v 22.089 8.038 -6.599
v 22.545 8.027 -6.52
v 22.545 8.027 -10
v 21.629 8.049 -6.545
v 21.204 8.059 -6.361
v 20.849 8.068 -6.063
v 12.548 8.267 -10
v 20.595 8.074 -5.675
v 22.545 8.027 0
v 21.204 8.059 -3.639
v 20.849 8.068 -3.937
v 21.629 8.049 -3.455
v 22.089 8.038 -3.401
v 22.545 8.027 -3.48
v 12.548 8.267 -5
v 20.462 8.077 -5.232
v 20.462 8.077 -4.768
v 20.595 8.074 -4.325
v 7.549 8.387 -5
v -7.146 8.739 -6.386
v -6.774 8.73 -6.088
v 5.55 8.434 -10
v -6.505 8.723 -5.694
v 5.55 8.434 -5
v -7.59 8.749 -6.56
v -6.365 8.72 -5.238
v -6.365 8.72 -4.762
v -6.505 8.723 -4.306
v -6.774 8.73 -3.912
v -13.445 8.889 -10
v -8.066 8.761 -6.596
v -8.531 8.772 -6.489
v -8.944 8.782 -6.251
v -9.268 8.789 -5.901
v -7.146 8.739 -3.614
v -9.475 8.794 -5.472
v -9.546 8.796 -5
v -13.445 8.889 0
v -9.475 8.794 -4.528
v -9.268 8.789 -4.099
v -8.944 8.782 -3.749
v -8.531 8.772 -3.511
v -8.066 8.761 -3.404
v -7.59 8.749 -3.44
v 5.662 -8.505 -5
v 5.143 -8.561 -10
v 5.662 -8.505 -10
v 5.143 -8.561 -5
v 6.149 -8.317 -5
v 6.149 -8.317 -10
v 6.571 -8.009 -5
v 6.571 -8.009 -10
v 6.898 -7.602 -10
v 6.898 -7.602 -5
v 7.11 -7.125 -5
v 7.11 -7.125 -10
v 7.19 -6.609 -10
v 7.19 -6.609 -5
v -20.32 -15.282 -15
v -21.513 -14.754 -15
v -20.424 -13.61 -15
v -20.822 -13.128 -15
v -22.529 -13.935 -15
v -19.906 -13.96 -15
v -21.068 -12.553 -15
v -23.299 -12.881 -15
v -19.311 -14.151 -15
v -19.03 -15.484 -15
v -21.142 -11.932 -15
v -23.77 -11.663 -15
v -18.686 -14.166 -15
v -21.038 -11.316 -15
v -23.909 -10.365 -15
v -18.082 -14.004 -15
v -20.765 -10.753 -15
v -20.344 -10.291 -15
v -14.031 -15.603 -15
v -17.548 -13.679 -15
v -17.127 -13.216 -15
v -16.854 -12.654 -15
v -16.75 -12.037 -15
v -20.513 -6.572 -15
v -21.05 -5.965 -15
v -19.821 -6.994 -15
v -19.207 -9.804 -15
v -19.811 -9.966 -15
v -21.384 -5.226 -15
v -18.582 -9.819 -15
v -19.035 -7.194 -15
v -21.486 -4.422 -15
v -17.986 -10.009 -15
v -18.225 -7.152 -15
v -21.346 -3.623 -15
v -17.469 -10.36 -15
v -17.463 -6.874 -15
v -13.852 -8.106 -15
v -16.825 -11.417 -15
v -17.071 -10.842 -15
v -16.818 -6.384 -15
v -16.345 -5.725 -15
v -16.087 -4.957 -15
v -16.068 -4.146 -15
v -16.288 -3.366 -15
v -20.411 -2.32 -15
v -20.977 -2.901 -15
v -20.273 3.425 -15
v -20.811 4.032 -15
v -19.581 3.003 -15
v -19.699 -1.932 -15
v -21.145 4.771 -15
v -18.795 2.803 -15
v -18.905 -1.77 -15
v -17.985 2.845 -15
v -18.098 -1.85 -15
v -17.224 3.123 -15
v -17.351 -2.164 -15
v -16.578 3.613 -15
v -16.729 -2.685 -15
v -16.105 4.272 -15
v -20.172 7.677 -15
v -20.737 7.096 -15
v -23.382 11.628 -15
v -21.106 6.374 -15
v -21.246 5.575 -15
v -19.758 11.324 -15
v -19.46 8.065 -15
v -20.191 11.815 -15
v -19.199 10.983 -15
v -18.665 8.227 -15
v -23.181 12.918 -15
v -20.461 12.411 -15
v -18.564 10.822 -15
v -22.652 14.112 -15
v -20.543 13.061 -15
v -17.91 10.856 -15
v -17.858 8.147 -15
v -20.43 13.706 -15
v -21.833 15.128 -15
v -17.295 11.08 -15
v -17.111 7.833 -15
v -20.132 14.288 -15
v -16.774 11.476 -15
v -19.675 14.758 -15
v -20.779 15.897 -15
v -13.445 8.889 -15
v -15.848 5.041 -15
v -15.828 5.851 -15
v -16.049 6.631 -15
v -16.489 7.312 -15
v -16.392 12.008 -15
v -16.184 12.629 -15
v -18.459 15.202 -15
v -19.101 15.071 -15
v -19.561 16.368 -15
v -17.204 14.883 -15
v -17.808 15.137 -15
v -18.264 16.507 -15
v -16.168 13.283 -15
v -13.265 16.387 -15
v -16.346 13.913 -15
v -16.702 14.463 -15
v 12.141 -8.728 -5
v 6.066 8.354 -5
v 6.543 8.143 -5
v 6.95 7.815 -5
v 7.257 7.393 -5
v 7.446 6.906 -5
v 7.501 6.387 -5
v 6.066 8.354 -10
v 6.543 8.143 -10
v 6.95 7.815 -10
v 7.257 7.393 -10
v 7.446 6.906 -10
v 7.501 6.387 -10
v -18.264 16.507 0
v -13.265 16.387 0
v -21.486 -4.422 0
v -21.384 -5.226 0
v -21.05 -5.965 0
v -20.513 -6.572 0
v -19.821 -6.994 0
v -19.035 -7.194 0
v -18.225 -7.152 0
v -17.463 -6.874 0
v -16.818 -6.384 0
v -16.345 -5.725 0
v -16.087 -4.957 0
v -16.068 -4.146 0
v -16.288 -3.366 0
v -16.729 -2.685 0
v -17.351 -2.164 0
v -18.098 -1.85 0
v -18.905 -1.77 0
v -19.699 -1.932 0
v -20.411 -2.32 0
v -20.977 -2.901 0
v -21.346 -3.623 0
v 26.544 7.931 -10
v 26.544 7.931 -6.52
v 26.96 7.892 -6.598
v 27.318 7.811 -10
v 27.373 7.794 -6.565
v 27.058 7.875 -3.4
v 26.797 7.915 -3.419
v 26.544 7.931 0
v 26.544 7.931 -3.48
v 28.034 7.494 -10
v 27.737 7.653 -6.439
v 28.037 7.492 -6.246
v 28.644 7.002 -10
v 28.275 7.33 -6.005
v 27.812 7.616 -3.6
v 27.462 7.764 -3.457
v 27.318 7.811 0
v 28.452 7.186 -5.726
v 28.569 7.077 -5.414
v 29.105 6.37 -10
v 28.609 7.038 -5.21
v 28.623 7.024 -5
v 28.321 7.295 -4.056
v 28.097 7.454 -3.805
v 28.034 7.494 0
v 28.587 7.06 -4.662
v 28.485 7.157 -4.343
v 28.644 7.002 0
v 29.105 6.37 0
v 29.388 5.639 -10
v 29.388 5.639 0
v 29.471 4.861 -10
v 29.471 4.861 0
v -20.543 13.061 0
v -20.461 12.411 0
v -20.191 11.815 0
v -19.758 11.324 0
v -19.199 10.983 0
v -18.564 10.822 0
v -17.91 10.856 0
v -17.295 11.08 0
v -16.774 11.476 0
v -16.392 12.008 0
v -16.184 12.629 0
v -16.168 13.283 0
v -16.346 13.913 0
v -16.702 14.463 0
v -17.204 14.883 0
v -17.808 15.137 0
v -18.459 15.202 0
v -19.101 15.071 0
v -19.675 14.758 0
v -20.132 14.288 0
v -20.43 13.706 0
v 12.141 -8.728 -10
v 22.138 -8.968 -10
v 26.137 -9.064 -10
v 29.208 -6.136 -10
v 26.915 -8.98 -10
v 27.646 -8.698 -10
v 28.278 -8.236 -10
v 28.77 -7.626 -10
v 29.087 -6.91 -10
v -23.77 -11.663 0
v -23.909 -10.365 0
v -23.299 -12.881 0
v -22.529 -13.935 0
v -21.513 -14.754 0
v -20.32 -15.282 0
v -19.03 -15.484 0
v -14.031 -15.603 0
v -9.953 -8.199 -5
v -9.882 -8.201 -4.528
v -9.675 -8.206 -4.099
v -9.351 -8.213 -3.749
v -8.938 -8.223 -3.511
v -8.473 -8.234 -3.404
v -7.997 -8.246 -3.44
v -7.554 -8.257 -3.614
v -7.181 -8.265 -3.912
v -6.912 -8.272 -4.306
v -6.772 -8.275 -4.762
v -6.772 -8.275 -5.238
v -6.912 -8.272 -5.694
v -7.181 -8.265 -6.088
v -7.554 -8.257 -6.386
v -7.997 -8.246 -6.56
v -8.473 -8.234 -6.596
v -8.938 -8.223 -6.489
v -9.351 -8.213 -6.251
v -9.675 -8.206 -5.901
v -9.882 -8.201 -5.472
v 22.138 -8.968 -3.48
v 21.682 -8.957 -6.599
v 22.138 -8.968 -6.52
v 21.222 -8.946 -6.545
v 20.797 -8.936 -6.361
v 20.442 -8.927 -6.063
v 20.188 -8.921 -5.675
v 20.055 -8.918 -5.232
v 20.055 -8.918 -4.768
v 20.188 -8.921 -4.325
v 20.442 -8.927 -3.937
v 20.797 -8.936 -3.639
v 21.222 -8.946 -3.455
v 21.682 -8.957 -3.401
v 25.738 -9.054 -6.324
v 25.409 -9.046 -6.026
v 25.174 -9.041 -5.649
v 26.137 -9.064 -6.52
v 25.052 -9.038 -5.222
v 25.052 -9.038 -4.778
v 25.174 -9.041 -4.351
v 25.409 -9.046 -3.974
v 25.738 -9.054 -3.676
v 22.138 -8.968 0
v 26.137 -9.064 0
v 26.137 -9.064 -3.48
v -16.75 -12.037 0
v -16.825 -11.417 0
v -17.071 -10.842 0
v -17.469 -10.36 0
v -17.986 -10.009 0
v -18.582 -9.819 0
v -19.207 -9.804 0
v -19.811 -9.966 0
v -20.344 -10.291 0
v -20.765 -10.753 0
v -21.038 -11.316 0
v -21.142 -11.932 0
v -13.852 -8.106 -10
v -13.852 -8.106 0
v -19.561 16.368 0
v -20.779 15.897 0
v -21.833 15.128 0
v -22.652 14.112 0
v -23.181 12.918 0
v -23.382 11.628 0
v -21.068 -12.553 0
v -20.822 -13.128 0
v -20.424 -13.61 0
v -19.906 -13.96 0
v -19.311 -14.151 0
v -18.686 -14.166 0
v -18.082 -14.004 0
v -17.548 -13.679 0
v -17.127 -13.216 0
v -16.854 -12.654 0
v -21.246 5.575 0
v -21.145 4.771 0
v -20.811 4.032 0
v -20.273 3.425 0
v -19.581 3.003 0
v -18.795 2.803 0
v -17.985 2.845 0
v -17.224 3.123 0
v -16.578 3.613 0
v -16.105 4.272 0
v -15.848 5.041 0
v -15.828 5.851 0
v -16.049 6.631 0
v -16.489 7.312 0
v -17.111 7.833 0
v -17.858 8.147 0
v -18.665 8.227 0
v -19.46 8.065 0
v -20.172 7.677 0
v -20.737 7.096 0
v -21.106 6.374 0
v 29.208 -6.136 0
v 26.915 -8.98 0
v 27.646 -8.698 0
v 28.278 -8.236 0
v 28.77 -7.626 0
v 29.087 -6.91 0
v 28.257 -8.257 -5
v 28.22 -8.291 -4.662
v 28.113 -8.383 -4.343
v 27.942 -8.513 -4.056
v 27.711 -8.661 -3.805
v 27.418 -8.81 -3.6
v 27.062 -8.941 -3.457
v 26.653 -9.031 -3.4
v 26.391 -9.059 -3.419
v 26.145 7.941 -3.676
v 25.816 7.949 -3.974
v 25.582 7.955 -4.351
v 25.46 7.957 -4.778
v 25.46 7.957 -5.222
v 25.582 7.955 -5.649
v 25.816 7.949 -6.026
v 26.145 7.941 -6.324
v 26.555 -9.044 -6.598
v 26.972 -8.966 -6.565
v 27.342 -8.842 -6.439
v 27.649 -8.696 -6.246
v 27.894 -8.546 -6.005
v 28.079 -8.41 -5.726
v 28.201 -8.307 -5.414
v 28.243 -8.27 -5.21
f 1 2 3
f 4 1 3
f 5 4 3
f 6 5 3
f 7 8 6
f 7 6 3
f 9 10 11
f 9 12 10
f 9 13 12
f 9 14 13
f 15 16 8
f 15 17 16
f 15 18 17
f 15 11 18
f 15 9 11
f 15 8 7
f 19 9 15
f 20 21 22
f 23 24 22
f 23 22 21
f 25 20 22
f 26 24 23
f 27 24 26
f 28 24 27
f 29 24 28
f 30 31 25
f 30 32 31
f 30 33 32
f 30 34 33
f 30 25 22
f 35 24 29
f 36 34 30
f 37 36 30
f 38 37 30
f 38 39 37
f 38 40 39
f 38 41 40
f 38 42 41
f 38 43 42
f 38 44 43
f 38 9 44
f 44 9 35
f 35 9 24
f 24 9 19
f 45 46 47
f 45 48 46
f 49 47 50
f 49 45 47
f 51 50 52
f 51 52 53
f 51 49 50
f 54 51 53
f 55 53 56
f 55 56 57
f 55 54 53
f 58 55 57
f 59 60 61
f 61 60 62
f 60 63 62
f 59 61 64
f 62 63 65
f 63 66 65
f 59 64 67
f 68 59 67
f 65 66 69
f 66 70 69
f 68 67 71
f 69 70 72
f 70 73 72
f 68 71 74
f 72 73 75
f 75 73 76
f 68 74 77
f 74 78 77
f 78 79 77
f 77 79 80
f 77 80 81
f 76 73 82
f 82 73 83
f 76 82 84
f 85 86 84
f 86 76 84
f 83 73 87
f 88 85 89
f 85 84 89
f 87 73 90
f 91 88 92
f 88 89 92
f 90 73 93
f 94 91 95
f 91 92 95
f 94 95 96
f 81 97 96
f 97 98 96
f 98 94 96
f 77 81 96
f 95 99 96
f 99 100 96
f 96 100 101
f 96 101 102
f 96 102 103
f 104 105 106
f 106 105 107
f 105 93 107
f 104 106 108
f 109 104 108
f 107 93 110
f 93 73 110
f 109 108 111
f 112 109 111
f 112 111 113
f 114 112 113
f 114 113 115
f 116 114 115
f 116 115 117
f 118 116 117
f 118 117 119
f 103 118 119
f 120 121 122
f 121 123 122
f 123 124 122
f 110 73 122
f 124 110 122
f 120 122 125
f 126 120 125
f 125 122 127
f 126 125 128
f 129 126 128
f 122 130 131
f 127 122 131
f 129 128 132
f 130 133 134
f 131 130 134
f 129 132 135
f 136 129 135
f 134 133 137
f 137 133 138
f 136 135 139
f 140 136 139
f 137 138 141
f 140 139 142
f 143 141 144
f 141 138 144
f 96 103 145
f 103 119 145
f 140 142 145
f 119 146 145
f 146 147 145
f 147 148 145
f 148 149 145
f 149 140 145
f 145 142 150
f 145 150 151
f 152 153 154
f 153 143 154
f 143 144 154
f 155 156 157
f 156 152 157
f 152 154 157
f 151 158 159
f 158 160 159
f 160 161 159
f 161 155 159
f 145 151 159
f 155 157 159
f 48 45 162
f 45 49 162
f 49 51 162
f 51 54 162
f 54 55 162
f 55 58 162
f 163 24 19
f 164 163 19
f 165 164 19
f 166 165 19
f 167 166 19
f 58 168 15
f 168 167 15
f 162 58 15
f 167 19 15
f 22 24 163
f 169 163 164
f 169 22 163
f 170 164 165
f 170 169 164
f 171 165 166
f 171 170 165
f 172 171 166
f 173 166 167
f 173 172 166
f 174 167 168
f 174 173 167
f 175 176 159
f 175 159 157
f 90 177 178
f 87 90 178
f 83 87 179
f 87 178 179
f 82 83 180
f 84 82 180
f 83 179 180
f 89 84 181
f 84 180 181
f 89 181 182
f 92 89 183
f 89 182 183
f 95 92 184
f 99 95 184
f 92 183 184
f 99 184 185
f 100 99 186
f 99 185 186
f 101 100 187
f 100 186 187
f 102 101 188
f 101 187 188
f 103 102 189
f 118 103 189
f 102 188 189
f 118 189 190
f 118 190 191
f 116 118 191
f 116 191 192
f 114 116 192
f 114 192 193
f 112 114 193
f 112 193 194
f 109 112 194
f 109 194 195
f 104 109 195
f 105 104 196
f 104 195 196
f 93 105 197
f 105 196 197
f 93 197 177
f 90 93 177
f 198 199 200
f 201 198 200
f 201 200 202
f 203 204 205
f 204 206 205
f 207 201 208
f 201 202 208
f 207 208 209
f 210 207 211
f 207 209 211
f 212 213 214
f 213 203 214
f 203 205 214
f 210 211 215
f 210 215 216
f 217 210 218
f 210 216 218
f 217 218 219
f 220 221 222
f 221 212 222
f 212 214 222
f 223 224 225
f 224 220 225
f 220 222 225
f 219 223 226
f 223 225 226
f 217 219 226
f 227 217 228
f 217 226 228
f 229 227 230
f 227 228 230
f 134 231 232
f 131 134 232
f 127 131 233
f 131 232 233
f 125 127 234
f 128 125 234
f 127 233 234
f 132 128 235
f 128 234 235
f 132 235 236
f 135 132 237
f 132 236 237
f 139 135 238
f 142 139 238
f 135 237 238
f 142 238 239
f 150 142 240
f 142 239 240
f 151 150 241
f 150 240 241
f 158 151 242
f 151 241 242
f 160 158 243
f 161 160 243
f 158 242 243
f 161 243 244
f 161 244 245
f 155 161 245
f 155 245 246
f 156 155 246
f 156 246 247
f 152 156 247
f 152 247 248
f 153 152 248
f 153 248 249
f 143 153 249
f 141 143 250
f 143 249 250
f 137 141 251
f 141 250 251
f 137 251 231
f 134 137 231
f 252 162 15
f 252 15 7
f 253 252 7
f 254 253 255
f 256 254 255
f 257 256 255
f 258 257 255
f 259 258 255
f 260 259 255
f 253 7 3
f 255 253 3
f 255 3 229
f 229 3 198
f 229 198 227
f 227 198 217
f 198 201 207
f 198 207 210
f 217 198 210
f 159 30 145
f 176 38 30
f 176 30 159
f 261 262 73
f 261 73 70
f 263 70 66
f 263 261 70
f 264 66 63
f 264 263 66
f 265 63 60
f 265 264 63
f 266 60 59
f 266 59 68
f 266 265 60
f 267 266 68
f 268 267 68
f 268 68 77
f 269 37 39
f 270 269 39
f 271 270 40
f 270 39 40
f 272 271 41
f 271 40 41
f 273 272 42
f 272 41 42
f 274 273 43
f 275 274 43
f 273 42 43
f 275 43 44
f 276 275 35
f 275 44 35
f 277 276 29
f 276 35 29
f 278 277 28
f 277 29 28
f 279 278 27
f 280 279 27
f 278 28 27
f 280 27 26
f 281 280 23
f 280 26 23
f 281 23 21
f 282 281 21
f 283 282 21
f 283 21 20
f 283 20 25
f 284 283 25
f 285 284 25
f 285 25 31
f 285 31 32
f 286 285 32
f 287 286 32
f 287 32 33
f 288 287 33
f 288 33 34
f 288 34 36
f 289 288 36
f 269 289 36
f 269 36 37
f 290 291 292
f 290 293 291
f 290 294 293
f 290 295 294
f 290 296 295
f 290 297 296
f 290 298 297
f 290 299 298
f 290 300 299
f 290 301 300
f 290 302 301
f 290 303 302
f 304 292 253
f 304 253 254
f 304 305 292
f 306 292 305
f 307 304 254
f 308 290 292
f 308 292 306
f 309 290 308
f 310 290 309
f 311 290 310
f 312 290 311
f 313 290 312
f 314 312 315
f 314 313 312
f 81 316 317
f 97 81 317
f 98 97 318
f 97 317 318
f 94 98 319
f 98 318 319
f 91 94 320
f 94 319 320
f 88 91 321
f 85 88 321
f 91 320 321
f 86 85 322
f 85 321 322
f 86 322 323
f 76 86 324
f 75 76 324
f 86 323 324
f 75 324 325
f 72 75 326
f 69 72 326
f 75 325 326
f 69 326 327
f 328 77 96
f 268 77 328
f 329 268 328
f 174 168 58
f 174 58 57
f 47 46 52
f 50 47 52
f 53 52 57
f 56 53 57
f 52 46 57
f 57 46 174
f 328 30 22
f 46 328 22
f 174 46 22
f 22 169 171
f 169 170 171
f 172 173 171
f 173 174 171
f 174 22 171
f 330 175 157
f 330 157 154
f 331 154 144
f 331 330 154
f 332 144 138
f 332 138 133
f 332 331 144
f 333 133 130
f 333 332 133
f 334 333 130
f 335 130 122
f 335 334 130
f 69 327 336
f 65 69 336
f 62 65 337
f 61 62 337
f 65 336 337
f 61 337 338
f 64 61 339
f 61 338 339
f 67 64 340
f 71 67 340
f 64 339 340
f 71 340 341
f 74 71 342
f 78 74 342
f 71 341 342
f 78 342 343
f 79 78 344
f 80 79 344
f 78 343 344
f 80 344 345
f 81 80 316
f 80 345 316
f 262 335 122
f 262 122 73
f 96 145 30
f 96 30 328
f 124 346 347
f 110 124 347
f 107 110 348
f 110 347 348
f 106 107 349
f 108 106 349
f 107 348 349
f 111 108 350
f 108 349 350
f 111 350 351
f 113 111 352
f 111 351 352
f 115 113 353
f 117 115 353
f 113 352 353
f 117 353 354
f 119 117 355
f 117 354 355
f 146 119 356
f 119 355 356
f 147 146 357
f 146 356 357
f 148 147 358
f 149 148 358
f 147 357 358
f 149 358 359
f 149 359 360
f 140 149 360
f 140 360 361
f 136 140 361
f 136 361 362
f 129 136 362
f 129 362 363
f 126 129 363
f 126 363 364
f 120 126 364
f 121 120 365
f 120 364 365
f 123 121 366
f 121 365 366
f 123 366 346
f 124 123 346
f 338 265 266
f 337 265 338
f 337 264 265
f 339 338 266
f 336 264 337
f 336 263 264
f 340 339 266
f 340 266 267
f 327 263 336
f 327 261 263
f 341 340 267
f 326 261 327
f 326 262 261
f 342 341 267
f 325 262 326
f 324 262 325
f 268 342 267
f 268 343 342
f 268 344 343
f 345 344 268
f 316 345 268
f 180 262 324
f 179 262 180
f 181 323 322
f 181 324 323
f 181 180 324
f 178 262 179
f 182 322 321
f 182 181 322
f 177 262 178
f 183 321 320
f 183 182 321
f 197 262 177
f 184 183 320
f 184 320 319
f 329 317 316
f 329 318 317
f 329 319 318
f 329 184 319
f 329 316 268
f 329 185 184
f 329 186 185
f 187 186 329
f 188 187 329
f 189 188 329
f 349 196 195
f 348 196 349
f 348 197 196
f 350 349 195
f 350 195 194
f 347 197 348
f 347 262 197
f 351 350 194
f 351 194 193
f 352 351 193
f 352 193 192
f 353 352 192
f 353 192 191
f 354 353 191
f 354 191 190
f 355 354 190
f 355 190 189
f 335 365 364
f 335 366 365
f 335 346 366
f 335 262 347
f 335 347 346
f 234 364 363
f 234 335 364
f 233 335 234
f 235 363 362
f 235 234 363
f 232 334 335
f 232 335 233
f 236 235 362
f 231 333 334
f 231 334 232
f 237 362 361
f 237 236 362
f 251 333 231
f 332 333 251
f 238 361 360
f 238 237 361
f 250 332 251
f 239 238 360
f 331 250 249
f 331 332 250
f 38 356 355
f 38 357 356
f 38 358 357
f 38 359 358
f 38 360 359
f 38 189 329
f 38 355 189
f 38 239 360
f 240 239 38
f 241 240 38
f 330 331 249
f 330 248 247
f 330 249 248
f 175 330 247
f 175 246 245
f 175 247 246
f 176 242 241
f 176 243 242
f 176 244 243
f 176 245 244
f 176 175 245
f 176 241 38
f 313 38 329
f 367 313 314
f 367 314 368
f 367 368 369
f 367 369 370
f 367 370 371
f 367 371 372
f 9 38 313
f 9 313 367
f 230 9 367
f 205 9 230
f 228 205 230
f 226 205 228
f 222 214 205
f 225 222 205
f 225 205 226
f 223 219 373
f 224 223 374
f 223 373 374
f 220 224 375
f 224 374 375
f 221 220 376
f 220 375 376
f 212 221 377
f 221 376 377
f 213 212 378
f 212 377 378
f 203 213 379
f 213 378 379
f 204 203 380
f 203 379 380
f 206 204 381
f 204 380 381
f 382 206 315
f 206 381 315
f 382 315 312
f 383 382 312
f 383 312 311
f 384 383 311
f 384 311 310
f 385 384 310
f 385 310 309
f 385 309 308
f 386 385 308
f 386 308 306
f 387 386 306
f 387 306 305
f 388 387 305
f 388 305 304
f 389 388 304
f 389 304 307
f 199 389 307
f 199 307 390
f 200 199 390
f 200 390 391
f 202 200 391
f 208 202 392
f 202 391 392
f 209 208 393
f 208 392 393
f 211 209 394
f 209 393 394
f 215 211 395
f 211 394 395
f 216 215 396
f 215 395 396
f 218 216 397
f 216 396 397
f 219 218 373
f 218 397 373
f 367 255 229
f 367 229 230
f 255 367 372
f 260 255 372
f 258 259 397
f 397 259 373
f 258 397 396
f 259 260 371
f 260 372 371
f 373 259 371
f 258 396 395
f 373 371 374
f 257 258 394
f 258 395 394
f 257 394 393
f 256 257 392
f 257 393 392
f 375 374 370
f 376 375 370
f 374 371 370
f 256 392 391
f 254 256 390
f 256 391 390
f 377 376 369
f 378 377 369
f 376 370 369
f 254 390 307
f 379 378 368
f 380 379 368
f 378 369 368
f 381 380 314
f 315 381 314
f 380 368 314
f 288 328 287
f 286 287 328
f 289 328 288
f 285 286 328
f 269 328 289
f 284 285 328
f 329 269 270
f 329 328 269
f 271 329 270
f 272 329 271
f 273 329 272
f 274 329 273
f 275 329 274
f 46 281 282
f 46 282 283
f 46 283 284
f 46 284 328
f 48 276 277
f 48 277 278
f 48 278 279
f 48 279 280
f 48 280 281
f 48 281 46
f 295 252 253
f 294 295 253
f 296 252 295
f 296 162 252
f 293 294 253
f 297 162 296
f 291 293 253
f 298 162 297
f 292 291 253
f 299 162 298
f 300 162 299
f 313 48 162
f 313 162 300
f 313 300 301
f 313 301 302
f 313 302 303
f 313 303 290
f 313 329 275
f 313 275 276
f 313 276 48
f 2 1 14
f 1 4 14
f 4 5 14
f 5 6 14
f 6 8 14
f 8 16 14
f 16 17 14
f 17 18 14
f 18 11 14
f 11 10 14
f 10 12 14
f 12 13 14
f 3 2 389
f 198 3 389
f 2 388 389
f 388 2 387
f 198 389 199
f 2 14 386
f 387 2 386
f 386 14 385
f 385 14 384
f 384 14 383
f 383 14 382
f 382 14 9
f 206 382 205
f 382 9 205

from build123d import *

# Parameters (mm, degrees)
EXTRUDE_1_DEPTH     = 15
CUT_EXTRUDE_1_DEPTH = 5
SKETCH_3_R          = 1.6
SKETCH_3_W          = 5
SKETCH_3_H          = 5
CUT_EXTRUDE_2_DEPTH = 22
FILLET_1_R          = 2
SKETCH_4_W          = 9.58124175
SKETCH_4_H          = 10
EXTRUDE_2_DEPTH     = 17
SKETCH_5_R          = 1.6
CUT_EXTRUDE_3_DEPTH = 18
FILLET_2_R          = 3


with BuildPart() as part:
    # 草图1 → 凸台-拉伸1 (new body)
    with BuildSketch(Plane.XY):
        with BuildLine():
            Line((24.185160084, -7.016301696), (24.496510845, 5.979969335))
            ThreePointArc((24.496510845, 5.979969335), (23.944762934, 7.407806858), (22.544984649, 8.027295764))
            Line((22.544984649, 8.027295764), (-13.444688974, 8.889497871))
            Line((-13.444688974, 8.889497871), (-13.265063535, 16.387346543))
            Line((-13.265063535, 16.387346543), (-18.263629316, 16.507096835))
            ThreePointArc((-18.263629316, 16.507096835), (-21.833223125, 15.127727058), (-23.38194539, 11.628281347))
            Line((-23.38194539, 11.628281347), (-23.908846678, -10.36540809))
            ThreePointArc((-23.908846678, -10.36540809), (-22.5294769, -13.935001898), (-19.030031189, -15.483724163))
            Line((-19.030031189, -15.483724163), (-14.031465408, -15.603474456))
            Line((-14.031465408, -15.603474456), (-13.851839969, -8.105625784))
            Line((-13.851839969, -8.105625784), (22.137833654, -8.967827891))
            ThreePointArc((22.137833654, -8.967827891), (23.565671178, -8.41607998), (24.185160084, -7.016301696))
        make_face()
        with BuildLine():
            ThreePointArc((-16.75044735, -12.037331753), (-18.893602347, -9.788969482), (-21.141964619, -11.93212448))
            ThreePointArc((-21.141964619, -11.93212448), (-18.998809621, -14.180486751), (-16.75044735, -12.037331753))
        make_face(mode=Mode.SUBTRACT)
        with BuildLine():
            ThreePointArc((-16.04728092, -4.552025517), (-18.701434473, -1.76757982), (-21.48588017, -4.421733373))
            ThreePointArc((-21.48588017, -4.421733373), (-18.831726617, -7.20617907), (-16.04728092, -4.552025517))
        make_face(mode=Mode.SUBTRACT)
        with BuildLine():
            ThreePointArc((-15.807780335, 5.445106045), (-18.461933888, 8.229551742), (-21.246379585, 5.575398189))
            ThreePointArc((-21.246379585, 5.575398189), (-18.592226032, 2.790952492), (-15.807780335, 5.445106045))
        make_face(mode=Mode.SUBTRACT)
        with BuildLine():
            ThreePointArc((-16.151695887, 12.955497152), (-18.294850884, 15.203859423), (-20.543213156, 13.060704426))
            ThreePointArc((-20.543213156, 13.060704426), (-18.400058158, 10.812342154), (-16.151695887, 12.955497152))
        make_face(mode=Mode.SUBTRACT)
    extrude(amount=-EXTRUDE_1_DEPTH)

    # 草图2 → 切除-拉伸1 (cut)
    with BuildSketch(Plane(origin=(0, 0, -15), x_dir=(-1, 0, 0), z_dir=(0, 0, -1))):
        Polygon((13.444688974, 8.889497871), (13.851839969, -8.105625784), (-33.415838559, -15.121344773), (-27.379501609, 15.743180277), align=None)
    extrude(amount=-CUT_EXTRUDE_1_DEPTH, mode=Mode.SUBTRACT)

    # 草图3 → 切除-拉伸2 (cut)
    with BuildSketch(Plane(origin=(0.205130979, 8.562490084, 0), x_dir=(0.9997131562086496, -0.02395005852477245, 0), z_dir=(0.02395005852477245, 0.9997131562086496, 0))):
        with Locations(Location((21.846263557, 5, 0), (0, 0, 288.209956864))):
            Circle(SKETCH_3_R)
        with Locations(Location((-8.153736443, 5, 0), (0, 0, 180))):
            Circle(SKETCH_3_R)
        with Locations((9.846263557, 7.5)):
            Rectangle(SKETCH_3_W, SKETCH_3_H)
    extrude(amount=-CUT_EXTRUDE_2_DEPTH, mode=Mode.SUBTRACT)

    # 圆角1
    fillet_1_edges = [part.edges().sort_by_distance(p)[0] for p in [
        (7.142136311, -8.608577013, -7.5),
        (7.549287306, 8.386546642, -7.5),
    ]]
    fillet(fillet_1_edges, radius=FILLET_1_R)

    # 草图4 → 凸台-拉伸2 (add)
    with BuildSketch(Plane(origin=(-0.202020016, -8.432633571, 0), x_dir=(0.9997131562086498, -0.023950058524770876, 0), z_dir=(-0.023950058524770876, -0.9997131562086498, 0))):
        with Locations((24.555642682, -5)):
            Rectangle(SKETCH_4_W, SKETCH_4_H)
    extrude(amount=-EXTRUDE_2_DEPTH)

    # 草图5 → 切除-拉伸3 (cut)
    with BuildSketch(Plane(origin=(-0.202020016, -8.432633571, 0), x_dir=(0.9997131562086498, -0.023950058524770876, 0), z_dir=(-0.023950058524770876, -0.9997131562086498, 0))):
        with Locations((26.846263557, -5)):
            Circle(SKETCH_5_R)
    extrude(amount=-CUT_EXTRUDE_3_DEPTH, mode=Mode.SUBTRACT)

    # 圆角2
    # the kernel refuses this fillet: 3 mm, written as the material it takes off along each edge
    with BuildSketch(Plane(origin=(29.135825748, -9.135478301, 7.5), x_dir=(-0.9997131562086498, 0.023950058524770713, 0), z_dir=(0, 0, -1)), Plane(origin=(29.542976743, 7.859645355, 7.5), x_dir=(-0.023950058524770713, -0.9997131562086498, 0), z_dir=(0, 0, -1))) as fillet_2_piece_1:
        with BuildLine():
            CenterArc((FILLET_2_R, FILLET_2_R), FILLET_2_R, 180, 90)
            Line((0, FILLET_2_R), (0, 0))
            Line((0, 0), (FILLET_2_R, 0))
        make_face()
    extrude(amount=25, mode=Mode.SUBTRACT)


solid = part.part
